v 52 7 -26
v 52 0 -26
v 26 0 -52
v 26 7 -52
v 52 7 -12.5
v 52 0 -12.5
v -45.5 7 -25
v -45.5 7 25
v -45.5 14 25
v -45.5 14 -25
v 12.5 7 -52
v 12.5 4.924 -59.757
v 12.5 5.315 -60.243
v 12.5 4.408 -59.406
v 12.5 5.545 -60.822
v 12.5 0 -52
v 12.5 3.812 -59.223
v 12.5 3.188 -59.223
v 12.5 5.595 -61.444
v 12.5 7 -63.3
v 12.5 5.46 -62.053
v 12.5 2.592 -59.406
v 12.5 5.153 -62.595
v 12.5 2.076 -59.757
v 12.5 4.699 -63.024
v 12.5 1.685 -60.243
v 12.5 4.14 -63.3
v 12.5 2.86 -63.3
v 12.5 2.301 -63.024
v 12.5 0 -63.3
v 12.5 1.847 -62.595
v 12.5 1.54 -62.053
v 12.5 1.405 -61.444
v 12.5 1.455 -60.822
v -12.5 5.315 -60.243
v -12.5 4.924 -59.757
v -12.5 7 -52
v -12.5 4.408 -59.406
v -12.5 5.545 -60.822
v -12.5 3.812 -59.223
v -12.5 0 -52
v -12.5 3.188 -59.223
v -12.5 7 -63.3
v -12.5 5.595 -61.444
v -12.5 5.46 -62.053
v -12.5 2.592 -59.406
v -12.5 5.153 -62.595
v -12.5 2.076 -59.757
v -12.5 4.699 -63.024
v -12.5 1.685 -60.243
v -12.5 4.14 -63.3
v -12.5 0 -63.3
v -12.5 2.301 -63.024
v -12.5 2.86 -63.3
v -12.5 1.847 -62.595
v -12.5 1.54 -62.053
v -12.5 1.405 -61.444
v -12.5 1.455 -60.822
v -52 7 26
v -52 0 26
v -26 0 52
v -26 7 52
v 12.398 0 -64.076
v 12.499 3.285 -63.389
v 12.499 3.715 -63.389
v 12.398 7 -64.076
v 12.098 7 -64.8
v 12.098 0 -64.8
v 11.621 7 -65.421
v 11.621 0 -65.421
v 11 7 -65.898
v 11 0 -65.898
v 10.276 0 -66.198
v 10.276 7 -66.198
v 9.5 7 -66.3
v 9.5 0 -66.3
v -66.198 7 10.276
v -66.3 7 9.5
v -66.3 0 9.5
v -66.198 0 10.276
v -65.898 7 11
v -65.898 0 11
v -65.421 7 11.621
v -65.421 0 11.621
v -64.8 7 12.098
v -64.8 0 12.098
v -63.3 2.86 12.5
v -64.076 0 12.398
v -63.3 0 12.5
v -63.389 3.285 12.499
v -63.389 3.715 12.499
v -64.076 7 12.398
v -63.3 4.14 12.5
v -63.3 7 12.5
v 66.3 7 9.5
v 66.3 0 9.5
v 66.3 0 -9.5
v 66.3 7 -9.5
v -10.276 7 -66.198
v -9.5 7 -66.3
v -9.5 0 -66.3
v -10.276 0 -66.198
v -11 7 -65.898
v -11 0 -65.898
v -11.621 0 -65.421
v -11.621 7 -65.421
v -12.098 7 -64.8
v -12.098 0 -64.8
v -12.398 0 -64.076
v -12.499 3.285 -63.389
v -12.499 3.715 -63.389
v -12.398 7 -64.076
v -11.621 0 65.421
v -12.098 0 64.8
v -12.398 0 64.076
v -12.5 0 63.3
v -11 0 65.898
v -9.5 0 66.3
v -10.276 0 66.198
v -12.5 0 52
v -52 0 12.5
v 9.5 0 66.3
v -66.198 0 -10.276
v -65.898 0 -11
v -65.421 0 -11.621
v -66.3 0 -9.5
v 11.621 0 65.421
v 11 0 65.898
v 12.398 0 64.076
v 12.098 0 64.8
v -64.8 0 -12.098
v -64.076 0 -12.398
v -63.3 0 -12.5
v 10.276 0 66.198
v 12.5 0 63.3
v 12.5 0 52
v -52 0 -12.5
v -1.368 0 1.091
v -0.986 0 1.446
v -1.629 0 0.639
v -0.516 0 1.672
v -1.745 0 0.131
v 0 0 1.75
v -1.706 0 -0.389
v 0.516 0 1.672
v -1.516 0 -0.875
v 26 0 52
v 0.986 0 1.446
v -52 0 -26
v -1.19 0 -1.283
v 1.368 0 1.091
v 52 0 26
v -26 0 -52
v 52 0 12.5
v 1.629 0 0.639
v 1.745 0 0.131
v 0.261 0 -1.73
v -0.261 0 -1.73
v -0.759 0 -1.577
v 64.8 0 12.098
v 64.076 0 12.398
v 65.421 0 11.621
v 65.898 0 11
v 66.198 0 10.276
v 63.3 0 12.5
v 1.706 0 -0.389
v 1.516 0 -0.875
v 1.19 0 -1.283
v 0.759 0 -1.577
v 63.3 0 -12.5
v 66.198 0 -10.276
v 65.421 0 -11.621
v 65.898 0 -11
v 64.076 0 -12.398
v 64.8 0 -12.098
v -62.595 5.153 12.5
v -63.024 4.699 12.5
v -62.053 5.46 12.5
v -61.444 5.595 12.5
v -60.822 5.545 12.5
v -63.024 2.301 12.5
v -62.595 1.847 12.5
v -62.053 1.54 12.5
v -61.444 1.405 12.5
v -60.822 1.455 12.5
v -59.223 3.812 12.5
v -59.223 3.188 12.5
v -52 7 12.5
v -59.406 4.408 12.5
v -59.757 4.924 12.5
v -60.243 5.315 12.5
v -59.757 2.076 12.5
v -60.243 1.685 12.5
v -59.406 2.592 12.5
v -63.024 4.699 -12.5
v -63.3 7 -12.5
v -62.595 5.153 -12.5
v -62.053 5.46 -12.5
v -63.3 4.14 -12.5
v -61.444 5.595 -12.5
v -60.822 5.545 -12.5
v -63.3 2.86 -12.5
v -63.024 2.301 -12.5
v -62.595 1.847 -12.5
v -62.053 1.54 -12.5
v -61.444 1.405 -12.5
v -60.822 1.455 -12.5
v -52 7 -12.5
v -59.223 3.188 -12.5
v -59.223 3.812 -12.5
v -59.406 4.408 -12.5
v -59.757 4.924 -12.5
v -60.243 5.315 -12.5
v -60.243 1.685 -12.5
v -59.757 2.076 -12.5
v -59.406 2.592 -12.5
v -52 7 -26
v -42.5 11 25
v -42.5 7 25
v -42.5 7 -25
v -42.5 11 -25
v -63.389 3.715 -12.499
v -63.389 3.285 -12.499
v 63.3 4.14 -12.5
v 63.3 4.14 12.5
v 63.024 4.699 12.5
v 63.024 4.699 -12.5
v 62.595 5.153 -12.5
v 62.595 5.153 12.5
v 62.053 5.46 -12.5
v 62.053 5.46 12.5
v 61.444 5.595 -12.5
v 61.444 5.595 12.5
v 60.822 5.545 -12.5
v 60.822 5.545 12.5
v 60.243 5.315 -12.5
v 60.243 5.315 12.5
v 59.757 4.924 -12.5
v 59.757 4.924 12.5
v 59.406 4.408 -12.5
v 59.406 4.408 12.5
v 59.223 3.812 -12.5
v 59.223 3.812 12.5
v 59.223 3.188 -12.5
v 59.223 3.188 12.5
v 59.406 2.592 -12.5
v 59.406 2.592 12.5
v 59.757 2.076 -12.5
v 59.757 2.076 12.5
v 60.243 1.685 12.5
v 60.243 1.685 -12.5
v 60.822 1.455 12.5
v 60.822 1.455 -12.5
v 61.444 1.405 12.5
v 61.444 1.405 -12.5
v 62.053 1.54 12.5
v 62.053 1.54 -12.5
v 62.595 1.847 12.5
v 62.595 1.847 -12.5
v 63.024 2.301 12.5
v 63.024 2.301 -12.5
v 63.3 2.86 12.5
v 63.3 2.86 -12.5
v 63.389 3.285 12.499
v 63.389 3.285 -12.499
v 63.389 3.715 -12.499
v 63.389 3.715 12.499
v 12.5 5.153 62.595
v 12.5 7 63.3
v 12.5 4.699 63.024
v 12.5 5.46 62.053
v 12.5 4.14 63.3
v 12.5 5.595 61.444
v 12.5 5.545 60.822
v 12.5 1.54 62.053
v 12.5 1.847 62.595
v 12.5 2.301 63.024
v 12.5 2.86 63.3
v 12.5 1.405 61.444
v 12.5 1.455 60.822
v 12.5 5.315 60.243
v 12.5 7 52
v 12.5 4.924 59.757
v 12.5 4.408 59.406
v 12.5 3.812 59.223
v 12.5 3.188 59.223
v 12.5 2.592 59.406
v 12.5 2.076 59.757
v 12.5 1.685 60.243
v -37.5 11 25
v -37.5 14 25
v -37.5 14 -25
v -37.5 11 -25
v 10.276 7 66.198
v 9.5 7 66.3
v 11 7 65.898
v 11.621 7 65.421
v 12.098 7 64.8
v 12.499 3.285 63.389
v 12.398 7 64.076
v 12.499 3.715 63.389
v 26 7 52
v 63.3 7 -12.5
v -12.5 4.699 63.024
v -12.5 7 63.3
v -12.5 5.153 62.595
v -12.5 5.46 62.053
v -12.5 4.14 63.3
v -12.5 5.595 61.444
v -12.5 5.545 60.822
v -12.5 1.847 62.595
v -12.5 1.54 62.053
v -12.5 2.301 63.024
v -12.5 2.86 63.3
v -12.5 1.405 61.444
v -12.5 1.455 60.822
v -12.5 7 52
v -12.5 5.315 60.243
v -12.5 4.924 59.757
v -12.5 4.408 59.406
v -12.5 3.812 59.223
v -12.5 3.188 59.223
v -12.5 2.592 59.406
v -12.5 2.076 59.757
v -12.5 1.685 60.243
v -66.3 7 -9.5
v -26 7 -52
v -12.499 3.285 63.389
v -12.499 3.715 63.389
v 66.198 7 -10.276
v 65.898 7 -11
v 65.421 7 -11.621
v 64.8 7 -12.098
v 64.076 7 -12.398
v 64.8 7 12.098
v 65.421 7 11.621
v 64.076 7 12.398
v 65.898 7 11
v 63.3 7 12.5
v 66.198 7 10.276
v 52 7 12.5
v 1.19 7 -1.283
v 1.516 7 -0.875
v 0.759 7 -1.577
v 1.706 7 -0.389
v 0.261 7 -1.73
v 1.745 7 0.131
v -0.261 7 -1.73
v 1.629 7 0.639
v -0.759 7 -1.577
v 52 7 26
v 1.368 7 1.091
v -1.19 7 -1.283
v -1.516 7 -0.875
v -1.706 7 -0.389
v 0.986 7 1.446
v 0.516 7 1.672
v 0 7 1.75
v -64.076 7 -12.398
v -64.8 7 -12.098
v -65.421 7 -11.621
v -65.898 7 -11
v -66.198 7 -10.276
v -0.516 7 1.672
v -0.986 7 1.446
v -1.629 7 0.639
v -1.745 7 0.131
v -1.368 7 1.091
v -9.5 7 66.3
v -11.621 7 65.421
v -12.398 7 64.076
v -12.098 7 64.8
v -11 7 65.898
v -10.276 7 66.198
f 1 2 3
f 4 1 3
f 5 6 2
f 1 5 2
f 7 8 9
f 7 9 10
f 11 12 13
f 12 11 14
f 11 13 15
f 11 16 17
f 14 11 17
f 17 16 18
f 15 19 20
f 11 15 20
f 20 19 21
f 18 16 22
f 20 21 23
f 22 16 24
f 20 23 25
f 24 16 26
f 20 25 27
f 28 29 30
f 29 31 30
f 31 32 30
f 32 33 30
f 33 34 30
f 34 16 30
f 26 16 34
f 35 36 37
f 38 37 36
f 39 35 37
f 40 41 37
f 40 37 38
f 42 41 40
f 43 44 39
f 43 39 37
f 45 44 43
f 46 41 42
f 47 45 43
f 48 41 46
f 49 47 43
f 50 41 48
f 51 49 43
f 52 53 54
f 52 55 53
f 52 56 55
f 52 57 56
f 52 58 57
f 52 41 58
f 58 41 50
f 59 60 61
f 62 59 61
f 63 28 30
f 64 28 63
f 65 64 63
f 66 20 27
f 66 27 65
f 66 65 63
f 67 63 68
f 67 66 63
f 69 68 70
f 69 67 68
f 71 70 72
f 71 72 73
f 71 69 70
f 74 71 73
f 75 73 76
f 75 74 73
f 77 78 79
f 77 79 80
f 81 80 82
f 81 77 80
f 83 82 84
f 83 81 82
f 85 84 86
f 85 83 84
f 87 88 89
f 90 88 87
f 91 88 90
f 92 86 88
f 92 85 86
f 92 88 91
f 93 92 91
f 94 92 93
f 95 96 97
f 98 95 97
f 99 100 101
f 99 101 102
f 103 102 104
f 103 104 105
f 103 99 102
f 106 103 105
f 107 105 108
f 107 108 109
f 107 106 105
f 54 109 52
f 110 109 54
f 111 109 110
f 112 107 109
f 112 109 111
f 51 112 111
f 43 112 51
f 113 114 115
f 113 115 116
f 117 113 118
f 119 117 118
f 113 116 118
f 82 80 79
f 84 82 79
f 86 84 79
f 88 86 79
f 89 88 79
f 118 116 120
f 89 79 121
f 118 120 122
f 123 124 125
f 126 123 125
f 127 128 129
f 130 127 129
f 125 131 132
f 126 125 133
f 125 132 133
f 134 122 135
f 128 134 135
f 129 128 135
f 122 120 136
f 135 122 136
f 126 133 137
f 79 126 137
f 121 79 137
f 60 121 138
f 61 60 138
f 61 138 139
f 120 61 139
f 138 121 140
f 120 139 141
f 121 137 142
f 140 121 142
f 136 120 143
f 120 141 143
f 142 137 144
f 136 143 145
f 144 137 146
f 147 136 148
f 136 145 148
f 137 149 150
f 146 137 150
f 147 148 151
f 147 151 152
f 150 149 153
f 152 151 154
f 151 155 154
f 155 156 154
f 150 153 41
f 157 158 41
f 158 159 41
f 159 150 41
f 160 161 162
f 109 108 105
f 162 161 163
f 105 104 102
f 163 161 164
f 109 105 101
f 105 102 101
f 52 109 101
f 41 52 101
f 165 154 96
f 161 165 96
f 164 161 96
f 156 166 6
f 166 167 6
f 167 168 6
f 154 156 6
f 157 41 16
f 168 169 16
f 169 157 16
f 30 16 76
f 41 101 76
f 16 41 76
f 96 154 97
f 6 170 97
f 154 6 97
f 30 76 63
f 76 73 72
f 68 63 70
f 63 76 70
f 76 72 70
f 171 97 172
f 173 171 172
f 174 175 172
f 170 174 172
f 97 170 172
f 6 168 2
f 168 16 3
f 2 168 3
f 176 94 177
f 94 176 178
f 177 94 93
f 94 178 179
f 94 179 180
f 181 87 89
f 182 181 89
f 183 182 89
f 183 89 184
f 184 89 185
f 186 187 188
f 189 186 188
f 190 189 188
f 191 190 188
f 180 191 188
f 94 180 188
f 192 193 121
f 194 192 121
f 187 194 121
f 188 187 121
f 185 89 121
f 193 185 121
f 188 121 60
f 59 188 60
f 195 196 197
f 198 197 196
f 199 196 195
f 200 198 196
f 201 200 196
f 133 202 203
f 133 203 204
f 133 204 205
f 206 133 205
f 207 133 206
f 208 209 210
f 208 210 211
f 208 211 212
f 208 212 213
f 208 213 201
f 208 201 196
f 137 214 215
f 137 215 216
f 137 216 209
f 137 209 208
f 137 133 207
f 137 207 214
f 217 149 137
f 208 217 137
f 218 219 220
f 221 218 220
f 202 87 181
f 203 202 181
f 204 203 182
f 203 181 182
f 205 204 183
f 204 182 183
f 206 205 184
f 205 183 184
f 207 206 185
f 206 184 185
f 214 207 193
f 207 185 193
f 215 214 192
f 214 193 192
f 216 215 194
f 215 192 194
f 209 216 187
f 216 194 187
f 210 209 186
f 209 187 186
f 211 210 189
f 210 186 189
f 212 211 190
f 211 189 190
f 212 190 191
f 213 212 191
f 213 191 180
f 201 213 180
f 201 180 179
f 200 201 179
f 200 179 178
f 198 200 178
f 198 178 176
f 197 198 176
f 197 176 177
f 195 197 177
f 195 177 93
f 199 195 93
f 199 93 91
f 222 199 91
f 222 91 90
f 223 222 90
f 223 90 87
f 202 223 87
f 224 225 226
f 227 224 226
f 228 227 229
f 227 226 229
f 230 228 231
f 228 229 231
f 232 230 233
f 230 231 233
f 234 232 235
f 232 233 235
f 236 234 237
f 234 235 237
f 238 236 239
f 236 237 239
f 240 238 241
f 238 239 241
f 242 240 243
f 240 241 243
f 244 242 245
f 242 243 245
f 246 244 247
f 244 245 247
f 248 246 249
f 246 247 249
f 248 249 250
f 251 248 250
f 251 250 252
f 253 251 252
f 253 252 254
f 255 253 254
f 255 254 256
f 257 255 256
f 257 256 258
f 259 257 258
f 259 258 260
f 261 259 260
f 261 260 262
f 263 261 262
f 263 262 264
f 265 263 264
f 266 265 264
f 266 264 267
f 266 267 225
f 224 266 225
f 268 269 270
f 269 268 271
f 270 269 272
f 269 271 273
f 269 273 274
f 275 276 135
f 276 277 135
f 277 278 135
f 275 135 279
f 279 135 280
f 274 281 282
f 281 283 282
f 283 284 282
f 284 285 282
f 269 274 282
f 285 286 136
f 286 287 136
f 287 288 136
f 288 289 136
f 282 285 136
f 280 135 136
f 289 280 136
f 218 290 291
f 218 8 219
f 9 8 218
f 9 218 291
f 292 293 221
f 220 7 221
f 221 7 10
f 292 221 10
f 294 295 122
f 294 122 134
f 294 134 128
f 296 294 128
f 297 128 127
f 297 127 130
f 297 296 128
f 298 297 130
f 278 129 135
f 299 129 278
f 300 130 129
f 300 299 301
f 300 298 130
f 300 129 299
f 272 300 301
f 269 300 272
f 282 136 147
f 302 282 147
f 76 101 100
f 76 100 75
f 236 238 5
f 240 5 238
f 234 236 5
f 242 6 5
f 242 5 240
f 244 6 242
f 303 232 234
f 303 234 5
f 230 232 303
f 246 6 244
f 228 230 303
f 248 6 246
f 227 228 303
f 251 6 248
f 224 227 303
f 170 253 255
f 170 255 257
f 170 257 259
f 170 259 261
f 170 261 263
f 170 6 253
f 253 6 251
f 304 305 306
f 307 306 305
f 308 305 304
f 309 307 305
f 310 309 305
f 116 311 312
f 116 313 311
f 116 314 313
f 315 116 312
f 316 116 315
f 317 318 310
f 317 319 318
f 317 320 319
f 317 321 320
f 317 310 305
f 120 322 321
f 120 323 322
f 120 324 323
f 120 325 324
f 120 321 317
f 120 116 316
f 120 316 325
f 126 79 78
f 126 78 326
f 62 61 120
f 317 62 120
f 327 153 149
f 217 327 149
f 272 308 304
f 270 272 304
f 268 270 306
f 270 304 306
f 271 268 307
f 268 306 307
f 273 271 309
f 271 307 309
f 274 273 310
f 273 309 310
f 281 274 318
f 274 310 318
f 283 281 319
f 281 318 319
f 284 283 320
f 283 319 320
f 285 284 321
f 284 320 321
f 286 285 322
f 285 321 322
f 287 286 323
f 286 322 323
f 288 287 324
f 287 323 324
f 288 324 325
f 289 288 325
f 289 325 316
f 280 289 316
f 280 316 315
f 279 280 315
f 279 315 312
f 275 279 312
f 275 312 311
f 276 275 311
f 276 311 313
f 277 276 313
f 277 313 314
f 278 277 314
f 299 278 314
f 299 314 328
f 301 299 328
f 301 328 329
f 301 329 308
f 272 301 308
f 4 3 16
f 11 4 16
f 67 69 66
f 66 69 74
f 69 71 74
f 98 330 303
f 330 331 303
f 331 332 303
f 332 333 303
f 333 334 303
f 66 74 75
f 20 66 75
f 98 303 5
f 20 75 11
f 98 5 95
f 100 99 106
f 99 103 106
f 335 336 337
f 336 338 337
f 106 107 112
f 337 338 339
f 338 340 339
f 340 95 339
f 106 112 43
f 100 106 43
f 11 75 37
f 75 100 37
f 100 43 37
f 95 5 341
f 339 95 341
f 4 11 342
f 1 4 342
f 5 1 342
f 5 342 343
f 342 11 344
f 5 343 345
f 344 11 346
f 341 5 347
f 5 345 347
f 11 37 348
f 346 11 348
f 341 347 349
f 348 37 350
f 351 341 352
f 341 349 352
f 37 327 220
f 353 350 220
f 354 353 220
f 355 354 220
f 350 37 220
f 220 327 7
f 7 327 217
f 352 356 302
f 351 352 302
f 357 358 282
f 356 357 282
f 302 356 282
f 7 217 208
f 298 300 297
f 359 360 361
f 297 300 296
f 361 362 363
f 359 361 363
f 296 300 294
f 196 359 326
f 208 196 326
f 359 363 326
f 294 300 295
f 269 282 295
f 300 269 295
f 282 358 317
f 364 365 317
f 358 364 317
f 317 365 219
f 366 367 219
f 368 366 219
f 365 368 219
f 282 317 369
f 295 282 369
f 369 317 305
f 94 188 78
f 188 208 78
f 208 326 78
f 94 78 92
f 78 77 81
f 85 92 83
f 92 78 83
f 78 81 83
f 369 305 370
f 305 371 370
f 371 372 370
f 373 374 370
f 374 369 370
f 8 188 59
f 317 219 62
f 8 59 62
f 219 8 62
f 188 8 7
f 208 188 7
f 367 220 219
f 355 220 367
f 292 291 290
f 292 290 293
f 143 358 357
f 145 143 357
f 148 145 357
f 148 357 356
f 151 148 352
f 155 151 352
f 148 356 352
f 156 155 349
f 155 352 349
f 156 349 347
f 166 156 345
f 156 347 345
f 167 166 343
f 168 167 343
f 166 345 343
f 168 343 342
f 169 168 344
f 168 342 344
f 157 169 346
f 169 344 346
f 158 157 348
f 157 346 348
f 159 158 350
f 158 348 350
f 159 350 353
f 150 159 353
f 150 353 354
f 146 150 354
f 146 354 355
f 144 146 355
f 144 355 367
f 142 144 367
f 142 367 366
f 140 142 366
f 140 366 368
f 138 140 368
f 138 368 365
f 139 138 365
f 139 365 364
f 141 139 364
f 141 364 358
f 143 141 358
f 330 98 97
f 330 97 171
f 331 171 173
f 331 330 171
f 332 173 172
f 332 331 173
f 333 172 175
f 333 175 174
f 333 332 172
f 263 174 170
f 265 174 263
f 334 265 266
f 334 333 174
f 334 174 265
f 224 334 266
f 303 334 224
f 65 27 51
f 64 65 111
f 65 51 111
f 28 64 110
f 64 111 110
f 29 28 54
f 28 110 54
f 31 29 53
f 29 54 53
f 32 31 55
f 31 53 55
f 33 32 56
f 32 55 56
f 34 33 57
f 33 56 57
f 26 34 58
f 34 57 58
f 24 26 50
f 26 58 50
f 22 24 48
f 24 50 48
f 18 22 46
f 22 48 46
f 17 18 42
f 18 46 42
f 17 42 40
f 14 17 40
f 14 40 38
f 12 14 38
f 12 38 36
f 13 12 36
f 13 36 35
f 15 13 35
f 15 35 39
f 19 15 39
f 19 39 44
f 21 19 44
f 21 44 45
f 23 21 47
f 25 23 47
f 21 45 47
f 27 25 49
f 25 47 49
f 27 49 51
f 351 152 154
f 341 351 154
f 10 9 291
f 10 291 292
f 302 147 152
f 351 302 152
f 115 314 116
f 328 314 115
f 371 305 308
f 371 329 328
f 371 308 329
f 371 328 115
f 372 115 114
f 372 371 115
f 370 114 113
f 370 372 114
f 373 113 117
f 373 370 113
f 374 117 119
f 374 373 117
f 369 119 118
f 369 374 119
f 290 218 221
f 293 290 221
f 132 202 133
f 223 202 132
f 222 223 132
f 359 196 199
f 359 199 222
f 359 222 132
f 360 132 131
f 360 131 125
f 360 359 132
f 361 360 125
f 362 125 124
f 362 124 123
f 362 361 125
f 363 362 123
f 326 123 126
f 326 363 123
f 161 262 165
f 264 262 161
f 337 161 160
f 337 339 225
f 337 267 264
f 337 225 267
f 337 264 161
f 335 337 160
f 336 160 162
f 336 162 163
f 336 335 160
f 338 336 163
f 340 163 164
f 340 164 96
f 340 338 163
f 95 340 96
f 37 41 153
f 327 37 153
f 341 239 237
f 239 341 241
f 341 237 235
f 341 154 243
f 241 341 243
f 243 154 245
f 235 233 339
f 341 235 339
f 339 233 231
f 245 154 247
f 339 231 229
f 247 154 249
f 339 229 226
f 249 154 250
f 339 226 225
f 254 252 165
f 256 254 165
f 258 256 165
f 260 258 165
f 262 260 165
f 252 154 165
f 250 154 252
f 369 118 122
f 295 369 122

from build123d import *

# Parameters (mm, degrees)
SKETCH_1_W          = 14.3
SKETCH_1_H          = 25
SKETCH_1_W_2        = 25
SKETCH_1_H_2        = 14.3
EXTRUDE_1_DEPTH     = 7
FILLET_1_R          = 3
FILLET_3_R          = 23
EXTRUDE_START       = -7
EXTRUDE_2_DEPTH     = 7
SKETCH_7_R          = 1.75
CUT_EXTRUDE_5_DEPTH = 95.023294986
SKETCH_9_W          = 3
SKETCH_9_H          = 50
EXTRUDE_3_DEPTH     = 7
SKETCH_10_W         = 50
SKETCH_10_H         = 3
EXTRUDE_4_DEPTH     = 5
SKETCH_11_R         = 2.1
CUT_EXTRUDE_6_DEPTH = 104.928485027
SKETCH_12_R         = 2.1
CUT_EXTRUDE_7_DEPTH = 104.928485103


with BuildPart() as part:
    # 스케치1 → 보스-돌출1 (new body)
    with BuildSketch(Plane(origin=(0, 0, 0), x_dir=(1, 0, 0), z_dir=(0, 1, 0))):
        Polygon((-26, 52), (-39, 39), (-26, 39), (26, 39), (39, 39), (26, 52), (12.5, 52), (-12.5, 52), align=None)
        Polygon((-26, 39), (-39, 39), (-39, 26), align=None)
        Polygon((-39, 26), (-39, 39), (-52, 26), (-52, 12.5), (-52, -12.5), (-52, -26), (-39, -39), (-39, -26), align=None)
        with Locations((-59.15, 0)):
            Rectangle(SKETCH_1_W, SKETCH_1_H)
        with Locations((0, 59.15)):
            Rectangle(SKETCH_1_W_2, SKETCH_1_H_2)
        Polygon((39, 39), (26, 39), (39, 26), align=None)
        Polygon((52, 26), (39, 39), (39, 26), (39, -26), (39, -39), (52, -26), (52, -12.5), (52, 12.5), align=None)
        with Locations((59.15, 0)):
            Rectangle(SKETCH_1_W, SKETCH_1_H)
        Polygon((39, -39), (39, -26), (26, -39), align=None)
        Polygon((-26, -39), (-39, -39), (-26, -52), (-12.5, -52), (12.5, -52), (26, -52), (39, -39), (26, -39), align=None)
        Polygon((-26, -39), (-39, -26), (-39, -39), align=None)
        with Locations((0, -59.15)):
            Rectangle(SKETCH_1_W_2, SKETCH_1_H_2)
    extrude(amount=EXTRUDE_1_DEPTH)

    # 필렛1
    fillet_1_edges = [part.edges().sort_by_distance(p)[0] for p in [
        (12.5, 3.5, 66.3),
        (-12.5, 3.5, 66.3),
        (-66.3, 3.5, 12.5),
        (-66.3, 3.5, -12.5),
        (-12.5, 3.5, -66.3),
        (12.5, 3.5, -66.3),
        (66.3, 3.5, -12.5),
        (66.3, 3.5, 12.5),
    ]]
    fillet(fillet_1_edges, radius=FILLET_1_R)

    # 필렛3
    # the kernel refuses this fillet: 23 mm, written as the material it adds along each edge
    with BuildSketch(Plane(origin=(-39, 0, 26), x_dir=(0, 0, -1), z_dir=(0, 1, 0))) as fillet_3_piece_1:
        with BuildLine():
            CenterArc((FILLET_3_R * 0.414213562373, -FILLET_3_R), FILLET_3_R, 90, 45)
            Line((-FILLET_3_R * 0.292893218813, -FILLET_3_R * 0.292893218813), (0, 0))
            Line((0, 0), (FILLET_3_R * 0.414213562373, 0))
        make_face()
    extrude(amount=7)
    with BuildSketch(Plane(origin=(-26, 0, 39), x_dir=(1, 0, 0), z_dir=(0, 1, 0)), Plane(origin=(26, 0, 39), x_dir=(0.7071067811865479, 0, -0.7071067811865471), z_dir=(0, 1, 0)), Plane(origin=(39, 0, 26), x_dir=(0, 0, -1), z_dir=(0, 1, 0)), Plane(origin=(39, 0, -26), x_dir=(-0.7071067811865476, 0, -0.7071067811865476), z_dir=(0, 1, 0)), Plane(origin=(26, 0, -39), x_dir=(-1, 0, 0), z_dir=(0, 1, 0)), Plane(origin=(-26, 0, -39), x_dir=(-0.7071067811865471, 0, 0.7071067811865479), z_dir=(0, 1, 0)), Plane(origin=(-39, 0, -26), x_dir=(0, 0, 1), z_dir=(0, 1, 0))) as fillet_3_piece_2:
        with BuildLine():
            CenterArc((FILLET_3_R * 0.414213562373, FILLET_3_R), FILLET_3_R, 225, 45)
            Line((-FILLET_3_R * 0.292893218813, FILLET_3_R * 0.292893218813), (0, 0))
            Line((0, 0), (FILLET_3_R * 0.414213562373, 0))
        make_face()
    extrude(amount=7)

    # 스케치6 → 보스-돌출2 (add)
    with BuildSketch(Plane(origin=(0, 7, 0), x_dir=(1, 0, 0), z_dir=(0, 1, 0)).offset(EXTRUDE_START)):
        with BuildLine():
            Line((16.473088065, 39), (-16.473088065, 39))
            ThreePointArc((-16.473088065, 39), (-25.120040329, 37.312677367), (-32.4982797, 32.4982797))
            ThreePointArc((-32.4982797, 32.4982797), (-37.312677367, 25.120040329), (-39, 16.473088065))
            Line((-39, 16.473088065), (-39, -16.473088065))
            ThreePointArc((-39, -16.473088065), (-37.312677367, -25.120040329), (-32.4982797, -32.4982797))
            ThreePointArc((-32.4982797, -32.4982797), (-25.120040329, -37.312677367), (-16.473088065, -39))
            Line((-16.473088065, -39), (16.473088065, -39))
            ThreePointArc((16.473088065, -39), (25.120040329, -37.312677367), (32.4982797, -32.4982797))
            ThreePointArc((32.4982797, -32.4982797), (37.312677367, -25.120040329), (39, -16.473088065))
            Line((39, -16.473088065), (39, 16.473088065))
            ThreePointArc((39, 16.473088065), (37.312677367, 25.120040329), (32.4982797, 32.4982797))
            ThreePointArc((32.4982797, 32.4982797), (25.120040329, 37.312677367), (16.473088065, 39))
        make_face()
    extrude(amount=EXTRUDE_2_DEPTH)

    # 스케치7 → 컷-돌출5 (cut, through all)
    with BuildSketch(Plane(origin=(0, 7, 0), x_dir=(1, 0, 0), z_dir=(0, 1, 0))):
        with Locations(Location((0, 0, 0), (0, 0, 270))):
            Circle(SKETCH_7_R)
    extrude(amount=-CUT_EXTRUDE_5_DEPTH, mode=Mode.SUBTRACT)

    # 스케치9 → 보스-돌출3 (add)
    with BuildSketch(Plane(origin=(0, 7, 0), x_dir=(1, 0, 0), z_dir=(0, 1, 0))):
        with Locations((-44, 0)):
            Rectangle(SKETCH_9_W, SKETCH_9_H)
    extrude(amount=EXTRUDE_3_DEPTH)

    # 스케치10 → 보스-돌출4 (add)
    with BuildSketch(Plane(origin=(-42.5, 0, 0), x_dir=(0, 0, -1), z_dir=(1, 0, 0))):
        with Locations((0, 12.5)):
            Rectangle(SKETCH_10_W, SKETCH_10_H)
    extrude(amount=EXTRUDE_4_DEPTH)

    # 스케치11 → 컷-돌출6 (cut, through all)
    with BuildSketch(Plane.XY.offset(12.5)):
        with Locations(Location((-61.3, 3.5, 0), (0, 0, 197.752790162))):
            Circle(SKETCH_11_R)
        with Locations(Location((61.3, 3.5, 0), (0, 0, 17.752790162))):
            Circle(SKETCH_11_R)
    extrude(amount=-CUT_EXTRUDE_6_DEPTH, mode=Mode.SUBTRACT)

    # 스케치12 → 컷-돌출7 (cut, through all)
    with BuildSketch(Plane.ZY.offset(12.5)):
        with Locations(Location((-61.3, 3.5, 0), (0, 0, 162.247209838))):
            Circle(SKETCH_12_R)
        with Locations(Location((61.3, 3.5, 0), (0, 0, 17.752790162))):
            Circle(SKETCH_12_R)
    extrude(amount=-CUT_EXTRUDE_7_DEPTH, mode=Mode.SUBTRACT)


solid = part.part
